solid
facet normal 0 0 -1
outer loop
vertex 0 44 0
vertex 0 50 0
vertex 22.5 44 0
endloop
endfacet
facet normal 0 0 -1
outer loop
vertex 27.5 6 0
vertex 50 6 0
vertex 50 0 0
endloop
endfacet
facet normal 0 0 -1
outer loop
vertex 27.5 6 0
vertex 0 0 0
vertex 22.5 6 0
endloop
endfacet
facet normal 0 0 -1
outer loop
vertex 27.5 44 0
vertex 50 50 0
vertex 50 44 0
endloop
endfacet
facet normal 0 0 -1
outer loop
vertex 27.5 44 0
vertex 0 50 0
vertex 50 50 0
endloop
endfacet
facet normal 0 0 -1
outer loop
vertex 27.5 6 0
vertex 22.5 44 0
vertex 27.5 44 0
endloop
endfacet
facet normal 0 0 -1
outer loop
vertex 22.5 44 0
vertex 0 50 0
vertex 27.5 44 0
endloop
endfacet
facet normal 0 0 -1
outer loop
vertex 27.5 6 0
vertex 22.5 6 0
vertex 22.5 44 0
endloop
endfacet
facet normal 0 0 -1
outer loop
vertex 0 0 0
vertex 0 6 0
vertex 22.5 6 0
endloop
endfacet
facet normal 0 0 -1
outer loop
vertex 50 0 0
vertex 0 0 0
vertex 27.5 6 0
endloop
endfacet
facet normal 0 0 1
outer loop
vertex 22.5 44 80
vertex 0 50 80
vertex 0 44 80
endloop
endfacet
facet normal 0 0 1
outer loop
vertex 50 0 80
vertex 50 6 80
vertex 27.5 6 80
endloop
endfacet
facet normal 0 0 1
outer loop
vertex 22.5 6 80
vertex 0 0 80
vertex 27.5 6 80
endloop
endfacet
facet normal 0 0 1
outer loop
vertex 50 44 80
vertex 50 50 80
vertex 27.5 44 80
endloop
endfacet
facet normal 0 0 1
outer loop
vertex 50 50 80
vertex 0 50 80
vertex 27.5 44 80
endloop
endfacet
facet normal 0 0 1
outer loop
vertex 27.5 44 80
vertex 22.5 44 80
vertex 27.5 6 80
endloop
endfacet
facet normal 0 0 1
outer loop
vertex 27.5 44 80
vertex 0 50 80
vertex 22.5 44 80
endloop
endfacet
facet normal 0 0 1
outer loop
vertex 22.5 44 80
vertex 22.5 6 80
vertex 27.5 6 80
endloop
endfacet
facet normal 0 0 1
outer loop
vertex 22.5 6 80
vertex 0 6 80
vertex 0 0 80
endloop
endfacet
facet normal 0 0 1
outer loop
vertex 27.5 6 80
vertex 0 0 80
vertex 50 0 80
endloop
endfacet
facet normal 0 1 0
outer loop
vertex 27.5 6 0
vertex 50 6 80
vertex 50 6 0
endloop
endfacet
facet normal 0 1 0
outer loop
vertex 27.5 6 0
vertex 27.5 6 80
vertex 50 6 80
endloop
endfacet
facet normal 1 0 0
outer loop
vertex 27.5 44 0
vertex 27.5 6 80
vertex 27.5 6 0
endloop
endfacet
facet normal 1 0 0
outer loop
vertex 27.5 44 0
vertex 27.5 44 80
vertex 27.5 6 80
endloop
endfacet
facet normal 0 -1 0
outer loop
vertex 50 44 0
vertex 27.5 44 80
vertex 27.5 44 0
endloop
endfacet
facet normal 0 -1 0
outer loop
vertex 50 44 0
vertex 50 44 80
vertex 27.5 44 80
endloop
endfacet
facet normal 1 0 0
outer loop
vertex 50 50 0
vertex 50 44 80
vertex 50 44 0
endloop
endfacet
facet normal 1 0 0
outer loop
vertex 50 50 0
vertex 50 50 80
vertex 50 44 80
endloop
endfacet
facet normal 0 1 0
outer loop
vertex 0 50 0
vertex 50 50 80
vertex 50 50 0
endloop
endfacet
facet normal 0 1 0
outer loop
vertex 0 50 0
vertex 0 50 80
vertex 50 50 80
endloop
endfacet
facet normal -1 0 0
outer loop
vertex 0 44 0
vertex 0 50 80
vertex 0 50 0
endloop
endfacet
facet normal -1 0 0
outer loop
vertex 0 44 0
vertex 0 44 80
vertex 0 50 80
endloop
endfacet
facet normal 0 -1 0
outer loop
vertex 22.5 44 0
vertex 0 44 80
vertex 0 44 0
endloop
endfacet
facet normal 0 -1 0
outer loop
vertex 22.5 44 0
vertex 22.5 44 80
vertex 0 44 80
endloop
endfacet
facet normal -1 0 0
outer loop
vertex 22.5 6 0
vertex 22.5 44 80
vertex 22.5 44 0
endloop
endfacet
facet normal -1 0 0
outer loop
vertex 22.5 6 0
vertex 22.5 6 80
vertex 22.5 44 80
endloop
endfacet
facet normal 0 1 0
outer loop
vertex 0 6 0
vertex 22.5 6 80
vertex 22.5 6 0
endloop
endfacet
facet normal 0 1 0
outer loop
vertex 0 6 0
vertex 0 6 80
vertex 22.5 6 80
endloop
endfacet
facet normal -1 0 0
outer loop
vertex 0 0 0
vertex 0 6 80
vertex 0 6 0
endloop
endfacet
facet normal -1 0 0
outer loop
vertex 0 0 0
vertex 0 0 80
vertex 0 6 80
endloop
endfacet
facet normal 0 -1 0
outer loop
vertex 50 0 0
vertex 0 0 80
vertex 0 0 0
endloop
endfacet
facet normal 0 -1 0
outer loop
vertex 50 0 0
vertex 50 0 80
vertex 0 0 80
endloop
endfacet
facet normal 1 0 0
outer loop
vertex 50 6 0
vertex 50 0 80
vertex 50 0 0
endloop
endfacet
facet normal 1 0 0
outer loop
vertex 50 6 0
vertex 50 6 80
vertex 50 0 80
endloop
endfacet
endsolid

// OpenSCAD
$fn = 32;

// ----------------------------------------------------------------------
// Structural section: ibeam 50 x 50 mm
// ----------------------------------------------------------------------

// --- parameters (mm) ---
sec_w = 50;               // section width, X
sec_h = 50;               // section height, Y
flange_t = 6;             // flange thickness
web_t = 5;                // web thickness
plate_t = 80;             // cut length, Z (extrusion height)

profile = [[0, 0], [50, 0], [50, 6], [27.5, 6], [27.5, 44], [50, 44], [50, 50], [0, 50], [0, 44], [22.5, 44], [22.5, 6], [0, 6]];  // primary outline, 12 points, counter clockwise

// --- the one profile operation ---
linear_extrude(height = plate_t) polygon(points = profile);
